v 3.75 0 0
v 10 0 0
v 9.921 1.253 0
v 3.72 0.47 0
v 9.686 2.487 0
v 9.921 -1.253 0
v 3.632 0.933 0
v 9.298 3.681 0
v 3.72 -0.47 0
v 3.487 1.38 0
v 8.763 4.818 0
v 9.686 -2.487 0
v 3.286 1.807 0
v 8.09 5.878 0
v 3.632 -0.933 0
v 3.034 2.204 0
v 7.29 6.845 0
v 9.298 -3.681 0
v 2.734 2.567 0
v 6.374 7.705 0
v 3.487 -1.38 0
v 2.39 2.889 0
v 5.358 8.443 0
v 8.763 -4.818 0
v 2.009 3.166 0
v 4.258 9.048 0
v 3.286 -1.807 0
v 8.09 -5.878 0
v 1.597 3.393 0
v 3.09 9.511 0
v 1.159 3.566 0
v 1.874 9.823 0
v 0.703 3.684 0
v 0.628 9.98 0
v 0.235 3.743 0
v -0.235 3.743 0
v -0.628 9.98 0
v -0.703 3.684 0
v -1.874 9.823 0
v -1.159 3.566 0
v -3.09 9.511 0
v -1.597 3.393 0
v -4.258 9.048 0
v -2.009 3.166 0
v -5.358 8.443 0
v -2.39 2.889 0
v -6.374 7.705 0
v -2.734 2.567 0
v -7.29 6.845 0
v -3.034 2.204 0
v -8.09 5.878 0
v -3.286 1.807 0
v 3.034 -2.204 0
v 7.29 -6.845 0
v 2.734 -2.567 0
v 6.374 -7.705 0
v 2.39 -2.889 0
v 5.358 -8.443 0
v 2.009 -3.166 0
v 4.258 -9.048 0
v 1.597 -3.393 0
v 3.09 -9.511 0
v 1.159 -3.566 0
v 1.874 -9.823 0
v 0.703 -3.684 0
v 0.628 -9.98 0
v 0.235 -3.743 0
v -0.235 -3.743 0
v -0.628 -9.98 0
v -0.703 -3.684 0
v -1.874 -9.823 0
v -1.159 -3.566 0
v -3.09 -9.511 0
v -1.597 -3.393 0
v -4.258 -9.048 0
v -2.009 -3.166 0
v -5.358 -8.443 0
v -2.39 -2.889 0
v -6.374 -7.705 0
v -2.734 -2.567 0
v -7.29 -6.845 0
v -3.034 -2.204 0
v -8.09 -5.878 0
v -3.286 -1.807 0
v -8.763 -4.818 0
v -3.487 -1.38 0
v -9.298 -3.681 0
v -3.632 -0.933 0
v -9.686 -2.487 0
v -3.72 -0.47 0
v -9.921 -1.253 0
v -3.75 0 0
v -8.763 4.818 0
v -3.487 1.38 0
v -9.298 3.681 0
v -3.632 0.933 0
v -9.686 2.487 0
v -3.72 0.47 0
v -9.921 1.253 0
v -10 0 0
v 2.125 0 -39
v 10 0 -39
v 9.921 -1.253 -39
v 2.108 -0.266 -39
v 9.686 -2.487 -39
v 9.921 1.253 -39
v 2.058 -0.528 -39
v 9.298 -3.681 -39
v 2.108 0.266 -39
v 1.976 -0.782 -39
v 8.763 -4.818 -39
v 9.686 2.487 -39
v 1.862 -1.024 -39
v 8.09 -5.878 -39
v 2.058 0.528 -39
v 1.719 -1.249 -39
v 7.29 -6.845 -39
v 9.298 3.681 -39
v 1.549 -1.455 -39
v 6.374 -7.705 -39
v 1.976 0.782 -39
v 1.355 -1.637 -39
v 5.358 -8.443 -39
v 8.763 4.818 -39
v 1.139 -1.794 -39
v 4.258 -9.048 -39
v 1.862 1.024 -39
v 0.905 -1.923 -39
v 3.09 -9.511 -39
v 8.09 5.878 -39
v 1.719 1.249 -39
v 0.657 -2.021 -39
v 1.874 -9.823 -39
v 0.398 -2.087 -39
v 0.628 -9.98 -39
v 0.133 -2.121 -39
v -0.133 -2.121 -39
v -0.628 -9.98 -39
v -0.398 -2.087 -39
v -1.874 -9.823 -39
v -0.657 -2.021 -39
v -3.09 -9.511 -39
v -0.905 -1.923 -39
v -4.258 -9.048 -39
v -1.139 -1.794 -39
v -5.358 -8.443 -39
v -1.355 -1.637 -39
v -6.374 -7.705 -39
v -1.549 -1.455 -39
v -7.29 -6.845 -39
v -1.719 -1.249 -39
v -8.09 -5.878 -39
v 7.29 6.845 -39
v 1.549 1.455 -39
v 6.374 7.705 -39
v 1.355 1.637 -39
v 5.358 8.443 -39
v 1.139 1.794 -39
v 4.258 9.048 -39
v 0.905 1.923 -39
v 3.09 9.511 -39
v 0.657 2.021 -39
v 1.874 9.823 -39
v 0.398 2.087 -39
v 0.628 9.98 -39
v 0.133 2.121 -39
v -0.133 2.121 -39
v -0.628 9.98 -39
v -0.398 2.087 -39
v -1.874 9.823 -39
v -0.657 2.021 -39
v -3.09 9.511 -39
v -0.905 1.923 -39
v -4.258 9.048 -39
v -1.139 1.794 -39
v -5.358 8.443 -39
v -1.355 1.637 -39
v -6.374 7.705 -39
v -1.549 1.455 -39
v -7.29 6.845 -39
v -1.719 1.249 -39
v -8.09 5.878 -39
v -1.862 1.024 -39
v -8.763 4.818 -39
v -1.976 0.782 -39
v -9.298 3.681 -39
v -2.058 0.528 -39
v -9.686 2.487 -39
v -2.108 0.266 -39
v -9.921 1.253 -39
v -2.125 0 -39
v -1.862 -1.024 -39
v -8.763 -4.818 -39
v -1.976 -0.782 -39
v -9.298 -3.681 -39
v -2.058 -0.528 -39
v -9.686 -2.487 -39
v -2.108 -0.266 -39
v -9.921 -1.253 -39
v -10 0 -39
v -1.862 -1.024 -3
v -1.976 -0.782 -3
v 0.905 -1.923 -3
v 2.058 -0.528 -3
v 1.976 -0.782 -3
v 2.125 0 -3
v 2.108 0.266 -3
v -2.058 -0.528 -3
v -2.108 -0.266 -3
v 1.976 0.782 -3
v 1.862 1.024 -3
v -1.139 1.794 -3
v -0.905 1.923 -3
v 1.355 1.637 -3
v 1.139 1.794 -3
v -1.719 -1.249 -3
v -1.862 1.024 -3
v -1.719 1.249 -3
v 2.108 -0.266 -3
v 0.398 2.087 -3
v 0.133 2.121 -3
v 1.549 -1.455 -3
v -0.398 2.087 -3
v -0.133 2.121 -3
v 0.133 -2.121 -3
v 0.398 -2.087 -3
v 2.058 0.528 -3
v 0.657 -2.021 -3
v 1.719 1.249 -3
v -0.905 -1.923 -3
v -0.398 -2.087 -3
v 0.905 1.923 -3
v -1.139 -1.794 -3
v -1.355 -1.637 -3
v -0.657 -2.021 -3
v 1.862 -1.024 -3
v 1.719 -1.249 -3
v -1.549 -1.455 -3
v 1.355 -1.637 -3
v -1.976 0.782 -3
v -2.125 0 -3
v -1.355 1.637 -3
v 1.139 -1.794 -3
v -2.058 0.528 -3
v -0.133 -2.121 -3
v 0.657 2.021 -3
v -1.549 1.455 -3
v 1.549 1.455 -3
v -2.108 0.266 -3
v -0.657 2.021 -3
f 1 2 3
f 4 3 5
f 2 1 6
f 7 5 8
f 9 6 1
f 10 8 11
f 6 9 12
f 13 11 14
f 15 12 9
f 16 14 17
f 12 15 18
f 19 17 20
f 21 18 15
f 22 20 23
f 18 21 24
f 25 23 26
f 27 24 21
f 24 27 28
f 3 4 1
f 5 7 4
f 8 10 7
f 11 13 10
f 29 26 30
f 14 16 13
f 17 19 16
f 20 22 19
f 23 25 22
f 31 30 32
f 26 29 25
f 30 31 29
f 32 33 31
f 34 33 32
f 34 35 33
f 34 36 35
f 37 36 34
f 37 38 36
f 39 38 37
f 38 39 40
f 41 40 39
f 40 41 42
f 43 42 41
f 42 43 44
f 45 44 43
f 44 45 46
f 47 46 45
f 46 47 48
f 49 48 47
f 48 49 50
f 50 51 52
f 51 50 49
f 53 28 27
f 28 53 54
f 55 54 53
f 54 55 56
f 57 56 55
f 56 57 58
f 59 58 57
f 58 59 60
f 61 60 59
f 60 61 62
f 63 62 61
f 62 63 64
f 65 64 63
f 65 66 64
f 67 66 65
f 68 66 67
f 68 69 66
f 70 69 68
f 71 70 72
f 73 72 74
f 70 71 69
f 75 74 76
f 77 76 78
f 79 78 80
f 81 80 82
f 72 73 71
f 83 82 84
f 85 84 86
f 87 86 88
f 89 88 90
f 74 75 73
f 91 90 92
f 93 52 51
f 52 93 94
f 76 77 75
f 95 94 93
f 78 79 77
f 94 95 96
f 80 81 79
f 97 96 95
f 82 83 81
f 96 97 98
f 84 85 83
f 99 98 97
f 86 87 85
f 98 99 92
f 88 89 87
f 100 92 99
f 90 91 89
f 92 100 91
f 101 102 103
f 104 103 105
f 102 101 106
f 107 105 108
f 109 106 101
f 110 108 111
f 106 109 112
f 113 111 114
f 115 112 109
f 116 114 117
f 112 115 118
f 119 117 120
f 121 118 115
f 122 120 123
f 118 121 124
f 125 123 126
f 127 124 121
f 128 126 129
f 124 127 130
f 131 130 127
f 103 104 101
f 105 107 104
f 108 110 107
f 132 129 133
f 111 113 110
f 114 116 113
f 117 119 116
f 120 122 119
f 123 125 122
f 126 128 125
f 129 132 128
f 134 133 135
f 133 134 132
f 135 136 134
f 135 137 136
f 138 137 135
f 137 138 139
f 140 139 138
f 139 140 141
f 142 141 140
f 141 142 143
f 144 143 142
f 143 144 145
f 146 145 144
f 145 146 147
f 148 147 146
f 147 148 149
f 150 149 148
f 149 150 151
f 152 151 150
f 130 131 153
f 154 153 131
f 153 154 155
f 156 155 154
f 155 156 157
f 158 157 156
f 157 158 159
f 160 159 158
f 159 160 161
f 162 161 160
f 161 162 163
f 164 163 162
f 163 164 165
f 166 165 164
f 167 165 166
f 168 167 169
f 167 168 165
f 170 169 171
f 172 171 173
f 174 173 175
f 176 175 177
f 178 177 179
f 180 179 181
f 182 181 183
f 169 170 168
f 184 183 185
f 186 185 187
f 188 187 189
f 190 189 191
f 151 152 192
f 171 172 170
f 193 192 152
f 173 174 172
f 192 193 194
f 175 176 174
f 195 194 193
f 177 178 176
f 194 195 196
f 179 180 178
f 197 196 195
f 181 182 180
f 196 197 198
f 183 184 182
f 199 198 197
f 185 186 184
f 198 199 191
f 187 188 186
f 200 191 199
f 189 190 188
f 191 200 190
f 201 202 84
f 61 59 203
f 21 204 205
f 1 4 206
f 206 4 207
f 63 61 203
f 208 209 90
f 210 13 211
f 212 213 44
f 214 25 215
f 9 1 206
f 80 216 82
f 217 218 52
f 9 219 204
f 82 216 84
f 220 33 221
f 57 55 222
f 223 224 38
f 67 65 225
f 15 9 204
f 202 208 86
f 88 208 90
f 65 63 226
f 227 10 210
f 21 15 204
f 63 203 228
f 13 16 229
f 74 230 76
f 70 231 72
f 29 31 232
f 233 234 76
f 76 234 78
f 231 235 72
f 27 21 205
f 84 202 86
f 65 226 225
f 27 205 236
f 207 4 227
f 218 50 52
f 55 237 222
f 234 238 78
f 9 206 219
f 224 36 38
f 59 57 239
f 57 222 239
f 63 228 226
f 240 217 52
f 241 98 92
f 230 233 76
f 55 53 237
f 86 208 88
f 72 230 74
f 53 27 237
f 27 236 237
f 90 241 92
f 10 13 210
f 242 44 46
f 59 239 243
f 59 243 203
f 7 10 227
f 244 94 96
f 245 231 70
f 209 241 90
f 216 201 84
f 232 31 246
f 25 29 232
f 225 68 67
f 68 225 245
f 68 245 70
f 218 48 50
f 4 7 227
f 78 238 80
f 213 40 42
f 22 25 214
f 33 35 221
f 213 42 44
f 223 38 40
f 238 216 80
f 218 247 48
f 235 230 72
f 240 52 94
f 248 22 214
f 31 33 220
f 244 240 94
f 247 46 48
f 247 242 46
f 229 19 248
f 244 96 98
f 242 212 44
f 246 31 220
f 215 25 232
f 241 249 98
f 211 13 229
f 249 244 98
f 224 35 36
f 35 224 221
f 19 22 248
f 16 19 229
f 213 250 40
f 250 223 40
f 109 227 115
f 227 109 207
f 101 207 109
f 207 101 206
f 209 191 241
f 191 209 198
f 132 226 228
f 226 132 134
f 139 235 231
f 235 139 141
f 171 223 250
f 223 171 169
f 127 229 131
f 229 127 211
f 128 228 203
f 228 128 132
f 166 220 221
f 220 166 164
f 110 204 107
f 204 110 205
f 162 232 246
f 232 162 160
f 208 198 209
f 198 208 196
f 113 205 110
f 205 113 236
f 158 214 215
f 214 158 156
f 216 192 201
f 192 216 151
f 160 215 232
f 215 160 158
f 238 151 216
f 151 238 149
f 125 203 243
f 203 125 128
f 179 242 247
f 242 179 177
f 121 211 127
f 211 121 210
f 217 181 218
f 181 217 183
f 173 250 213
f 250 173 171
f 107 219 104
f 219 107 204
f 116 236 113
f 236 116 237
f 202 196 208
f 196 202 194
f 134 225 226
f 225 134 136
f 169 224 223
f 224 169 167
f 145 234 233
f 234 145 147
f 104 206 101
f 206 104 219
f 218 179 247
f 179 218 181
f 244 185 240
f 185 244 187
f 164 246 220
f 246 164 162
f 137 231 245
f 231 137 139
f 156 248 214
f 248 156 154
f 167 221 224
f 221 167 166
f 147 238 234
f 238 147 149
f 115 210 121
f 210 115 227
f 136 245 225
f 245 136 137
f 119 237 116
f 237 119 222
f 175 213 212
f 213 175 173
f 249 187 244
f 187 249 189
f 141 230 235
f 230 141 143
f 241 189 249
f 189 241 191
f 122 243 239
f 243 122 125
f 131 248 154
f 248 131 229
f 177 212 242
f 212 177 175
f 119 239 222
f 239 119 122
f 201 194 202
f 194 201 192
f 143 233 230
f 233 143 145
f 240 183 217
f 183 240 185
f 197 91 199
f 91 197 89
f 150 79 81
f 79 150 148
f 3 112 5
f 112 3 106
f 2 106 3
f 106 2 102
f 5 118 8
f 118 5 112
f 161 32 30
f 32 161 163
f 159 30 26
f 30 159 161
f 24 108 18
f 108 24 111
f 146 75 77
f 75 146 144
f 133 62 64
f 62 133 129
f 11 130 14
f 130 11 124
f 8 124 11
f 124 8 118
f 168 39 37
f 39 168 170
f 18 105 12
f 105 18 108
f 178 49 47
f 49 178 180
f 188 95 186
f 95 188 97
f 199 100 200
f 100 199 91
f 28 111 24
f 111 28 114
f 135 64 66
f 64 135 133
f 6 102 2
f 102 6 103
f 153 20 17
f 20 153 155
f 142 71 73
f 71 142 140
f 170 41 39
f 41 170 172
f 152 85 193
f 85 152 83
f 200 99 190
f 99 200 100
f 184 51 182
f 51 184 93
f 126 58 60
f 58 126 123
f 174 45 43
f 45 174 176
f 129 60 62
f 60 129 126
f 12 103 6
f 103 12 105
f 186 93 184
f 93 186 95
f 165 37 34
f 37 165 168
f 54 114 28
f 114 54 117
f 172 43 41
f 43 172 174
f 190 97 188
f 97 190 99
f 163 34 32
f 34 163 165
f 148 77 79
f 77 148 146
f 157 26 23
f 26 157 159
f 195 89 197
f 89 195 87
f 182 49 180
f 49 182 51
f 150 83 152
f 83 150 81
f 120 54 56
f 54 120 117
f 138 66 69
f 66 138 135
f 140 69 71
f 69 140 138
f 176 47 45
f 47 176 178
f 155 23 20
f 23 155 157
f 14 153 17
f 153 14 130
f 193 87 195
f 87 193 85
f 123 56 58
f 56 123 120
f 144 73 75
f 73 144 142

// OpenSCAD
$fn = 50;


difference() {
	union() {
		translate(v = [0, 0, -39.0000000000]) {
			cylinder(h = 39, r = 10.0000000000);
		}
		cylinder(h = 0, r = 19.0000000000);
	}
	union() {
		translate(v = [0, 0, 0]) {
			rotate(a = [0, 0, 0]) {
				difference() {
					union() {
						#translate(v = [0, 0, -39.0000000000]) {
							cylinder(h = 39, r = 2.0000000000);
						}
						#translate(v = [0, 0, -3]) {
							cylinder(h = 3, r1 = 2.1250000000, r2 = 3.7500000000);
						}
						#translate(v = [0, 0, -39.0000000000]) {
							cylinder(h = 39, r = 2.1250000000);
						}
						#translate(v = [0, 0, -39.0000000000]) {
							cylinder(h = 39, r = 2.0000000000);
						}
					}
					union();
				}
			}
		}
	}
}
